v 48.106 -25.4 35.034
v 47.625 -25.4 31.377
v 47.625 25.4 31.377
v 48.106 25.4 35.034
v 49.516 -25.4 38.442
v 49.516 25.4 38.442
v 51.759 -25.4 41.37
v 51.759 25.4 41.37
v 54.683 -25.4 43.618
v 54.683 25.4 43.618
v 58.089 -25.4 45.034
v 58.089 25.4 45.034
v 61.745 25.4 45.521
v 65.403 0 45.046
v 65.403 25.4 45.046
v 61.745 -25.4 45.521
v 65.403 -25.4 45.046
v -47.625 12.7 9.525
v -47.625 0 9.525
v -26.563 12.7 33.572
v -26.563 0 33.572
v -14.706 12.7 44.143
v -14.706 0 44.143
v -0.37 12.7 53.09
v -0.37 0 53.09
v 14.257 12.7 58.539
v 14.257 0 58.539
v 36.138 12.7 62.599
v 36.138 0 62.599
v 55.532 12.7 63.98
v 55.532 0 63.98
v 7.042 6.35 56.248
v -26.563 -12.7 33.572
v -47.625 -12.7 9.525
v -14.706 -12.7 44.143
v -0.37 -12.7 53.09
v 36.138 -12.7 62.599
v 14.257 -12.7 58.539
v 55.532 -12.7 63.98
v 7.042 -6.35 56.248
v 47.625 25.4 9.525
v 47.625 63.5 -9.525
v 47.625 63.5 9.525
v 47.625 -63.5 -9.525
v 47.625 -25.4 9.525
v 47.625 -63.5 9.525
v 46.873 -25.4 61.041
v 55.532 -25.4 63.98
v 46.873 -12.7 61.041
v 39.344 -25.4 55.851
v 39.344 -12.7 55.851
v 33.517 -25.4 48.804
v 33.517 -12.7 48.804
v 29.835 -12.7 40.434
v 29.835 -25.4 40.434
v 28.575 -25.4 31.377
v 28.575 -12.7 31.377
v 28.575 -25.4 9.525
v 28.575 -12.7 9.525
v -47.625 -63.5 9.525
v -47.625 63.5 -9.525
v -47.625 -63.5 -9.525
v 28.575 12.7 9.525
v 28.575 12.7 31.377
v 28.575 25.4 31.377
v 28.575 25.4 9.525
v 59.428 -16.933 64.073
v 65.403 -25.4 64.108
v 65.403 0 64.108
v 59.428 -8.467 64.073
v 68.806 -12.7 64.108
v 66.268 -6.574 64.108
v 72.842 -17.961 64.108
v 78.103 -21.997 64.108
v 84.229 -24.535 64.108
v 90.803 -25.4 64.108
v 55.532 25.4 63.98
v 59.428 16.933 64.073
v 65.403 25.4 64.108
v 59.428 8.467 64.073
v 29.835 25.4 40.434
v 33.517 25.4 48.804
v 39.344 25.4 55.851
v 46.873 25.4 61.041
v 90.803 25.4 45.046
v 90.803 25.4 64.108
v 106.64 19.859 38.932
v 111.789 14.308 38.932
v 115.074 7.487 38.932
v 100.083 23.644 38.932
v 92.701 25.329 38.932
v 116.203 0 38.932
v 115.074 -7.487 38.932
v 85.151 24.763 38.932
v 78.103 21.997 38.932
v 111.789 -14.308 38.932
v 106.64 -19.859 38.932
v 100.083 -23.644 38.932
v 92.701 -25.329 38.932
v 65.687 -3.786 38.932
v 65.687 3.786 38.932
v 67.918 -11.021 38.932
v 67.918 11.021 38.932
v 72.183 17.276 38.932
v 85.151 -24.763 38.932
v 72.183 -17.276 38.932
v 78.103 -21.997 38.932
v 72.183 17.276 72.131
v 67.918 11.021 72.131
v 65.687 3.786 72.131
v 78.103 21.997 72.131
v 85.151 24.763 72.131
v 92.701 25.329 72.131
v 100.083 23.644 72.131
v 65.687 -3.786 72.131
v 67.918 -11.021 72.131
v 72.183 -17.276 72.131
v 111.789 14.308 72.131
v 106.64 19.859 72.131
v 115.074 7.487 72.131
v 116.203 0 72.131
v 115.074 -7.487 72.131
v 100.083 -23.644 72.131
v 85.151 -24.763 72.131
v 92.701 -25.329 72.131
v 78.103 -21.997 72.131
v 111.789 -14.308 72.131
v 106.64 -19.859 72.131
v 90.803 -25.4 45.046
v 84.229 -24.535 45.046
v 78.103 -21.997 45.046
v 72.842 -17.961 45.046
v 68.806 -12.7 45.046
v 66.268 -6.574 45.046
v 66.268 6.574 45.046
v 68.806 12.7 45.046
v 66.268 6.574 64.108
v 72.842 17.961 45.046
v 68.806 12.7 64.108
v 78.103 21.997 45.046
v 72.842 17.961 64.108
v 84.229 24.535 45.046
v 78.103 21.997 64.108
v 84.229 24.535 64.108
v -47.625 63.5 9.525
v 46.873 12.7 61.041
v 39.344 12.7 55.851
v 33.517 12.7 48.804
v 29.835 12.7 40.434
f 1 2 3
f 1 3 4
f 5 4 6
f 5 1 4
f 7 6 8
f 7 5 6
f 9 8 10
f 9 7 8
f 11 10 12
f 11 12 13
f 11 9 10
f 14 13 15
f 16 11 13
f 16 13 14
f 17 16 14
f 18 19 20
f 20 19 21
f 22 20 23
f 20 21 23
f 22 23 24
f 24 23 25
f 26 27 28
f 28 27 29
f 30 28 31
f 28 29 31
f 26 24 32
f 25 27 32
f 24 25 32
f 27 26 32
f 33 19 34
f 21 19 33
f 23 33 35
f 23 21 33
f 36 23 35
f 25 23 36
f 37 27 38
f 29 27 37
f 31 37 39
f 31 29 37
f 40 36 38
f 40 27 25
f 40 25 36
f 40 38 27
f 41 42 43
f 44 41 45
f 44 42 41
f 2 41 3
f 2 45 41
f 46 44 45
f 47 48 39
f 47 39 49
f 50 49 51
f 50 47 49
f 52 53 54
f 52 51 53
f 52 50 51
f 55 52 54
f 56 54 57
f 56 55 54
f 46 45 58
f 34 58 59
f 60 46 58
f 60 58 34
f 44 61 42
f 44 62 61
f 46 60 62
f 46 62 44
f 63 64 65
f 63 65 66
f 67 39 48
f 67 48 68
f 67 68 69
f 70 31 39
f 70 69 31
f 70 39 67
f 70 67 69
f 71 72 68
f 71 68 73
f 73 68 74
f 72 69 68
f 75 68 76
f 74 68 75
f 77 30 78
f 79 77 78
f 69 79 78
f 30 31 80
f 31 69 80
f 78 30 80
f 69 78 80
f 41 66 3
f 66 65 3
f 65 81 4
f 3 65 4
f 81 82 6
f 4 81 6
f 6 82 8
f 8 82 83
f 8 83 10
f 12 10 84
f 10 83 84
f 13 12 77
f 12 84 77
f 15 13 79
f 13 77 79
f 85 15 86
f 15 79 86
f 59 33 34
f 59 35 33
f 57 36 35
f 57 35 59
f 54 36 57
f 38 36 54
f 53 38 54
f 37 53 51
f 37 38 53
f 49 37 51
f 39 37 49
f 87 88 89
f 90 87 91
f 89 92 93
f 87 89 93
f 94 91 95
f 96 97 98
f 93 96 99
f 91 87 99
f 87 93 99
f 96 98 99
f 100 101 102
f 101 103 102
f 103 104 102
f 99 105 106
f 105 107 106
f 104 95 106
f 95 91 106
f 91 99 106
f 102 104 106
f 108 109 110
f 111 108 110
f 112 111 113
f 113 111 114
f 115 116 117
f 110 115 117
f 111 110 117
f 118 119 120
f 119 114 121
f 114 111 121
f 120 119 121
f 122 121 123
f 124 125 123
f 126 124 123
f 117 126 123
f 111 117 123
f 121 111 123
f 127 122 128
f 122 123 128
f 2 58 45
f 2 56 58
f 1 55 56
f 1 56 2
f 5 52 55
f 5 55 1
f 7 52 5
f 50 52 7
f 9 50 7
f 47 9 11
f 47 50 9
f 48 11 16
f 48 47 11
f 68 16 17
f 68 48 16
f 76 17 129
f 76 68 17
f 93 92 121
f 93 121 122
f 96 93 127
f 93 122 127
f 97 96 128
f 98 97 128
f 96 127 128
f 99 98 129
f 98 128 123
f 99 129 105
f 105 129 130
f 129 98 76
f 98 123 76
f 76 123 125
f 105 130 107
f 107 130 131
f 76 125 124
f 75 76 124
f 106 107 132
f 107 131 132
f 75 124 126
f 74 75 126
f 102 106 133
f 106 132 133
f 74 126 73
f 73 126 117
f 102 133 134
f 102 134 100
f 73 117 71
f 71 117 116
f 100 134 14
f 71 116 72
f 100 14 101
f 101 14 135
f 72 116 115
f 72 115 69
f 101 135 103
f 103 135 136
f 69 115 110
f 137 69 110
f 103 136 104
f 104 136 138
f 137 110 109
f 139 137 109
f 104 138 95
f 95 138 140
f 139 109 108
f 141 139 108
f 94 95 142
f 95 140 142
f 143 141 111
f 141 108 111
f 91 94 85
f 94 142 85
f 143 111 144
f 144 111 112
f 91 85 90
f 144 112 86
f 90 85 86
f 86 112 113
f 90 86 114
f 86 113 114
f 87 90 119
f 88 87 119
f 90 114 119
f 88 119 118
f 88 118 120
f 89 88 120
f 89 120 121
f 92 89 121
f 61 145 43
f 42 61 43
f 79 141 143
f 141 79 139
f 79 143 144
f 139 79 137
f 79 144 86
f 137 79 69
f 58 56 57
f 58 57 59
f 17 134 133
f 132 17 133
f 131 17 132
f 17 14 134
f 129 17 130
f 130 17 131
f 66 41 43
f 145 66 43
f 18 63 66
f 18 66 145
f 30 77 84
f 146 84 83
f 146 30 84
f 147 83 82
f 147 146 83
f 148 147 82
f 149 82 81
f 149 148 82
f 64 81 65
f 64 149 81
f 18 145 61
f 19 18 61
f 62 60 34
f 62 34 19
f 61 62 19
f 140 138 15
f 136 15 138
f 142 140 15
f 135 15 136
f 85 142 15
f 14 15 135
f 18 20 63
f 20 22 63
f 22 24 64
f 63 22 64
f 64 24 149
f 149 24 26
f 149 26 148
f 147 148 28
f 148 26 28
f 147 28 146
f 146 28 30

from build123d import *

# Parameters (mm, degrees)
F1_DEPTH = 63.5
F2_DEPTH = 12.7
F0_W     = 25.4
F0_H     = 19.0624117216
F3_DEPTH = 25.4


# Not quite as in the source:
# - a feature names something its author has since deleted; it is built from what else it names


with BuildPart() as f1:
    # F0 (on Front) → F1 (new body, symmetric)
    with BuildSketch(Plane.XZ):
        Polygon((47.625, -9.525), (47.625, 9.525), (28.575, 9.525), (-47.625, 9.525), (-47.625, -9.525), align=None)
    extrude(amount=F1_DEPTH, both=True)

    # F0 (on Front) → F2 (join, symmetric)
    with BuildSketch(Plane.XZ):
        with BuildLine():
            Line((-47.625, 9.525), (28.575, 9.525))
            Line((28.575, 9.525), (28.575, 31.3774505112))
            ThreePointArc((28.575, 31.3774505112), (36.1870844323, 52.5292330788), (55.5320502217, 63.9797367269))
            add(Edge.make_bspline(
                [(-47.625, 9.525), (-32.001836586, 27.9945600123), (-8.2663538638, 59.5795130057), (42.691262939, 63.5782592588), (55.5320502217, 63.9797367269)],
                knots=[0, 0, 0, 0, 0.463039199, 0.7597377555, 0.7597377555, 0.7597377555, 0.7597377555], degree=3))
        make_face()
    extrude(amount=F2_DEPTH, both=True)

    # F0 (on Front) → F3 (join, symmetric)
    with BuildSketch(Plane.XZ):
        with BuildLine():
            Line((28.575, 9.525), (47.625, 9.525))
            Line((47.625, 9.525), (47.625, 31.3774505112))
            ThreePointArc((47.625, 31.3774505112), (53.1477549989, 42.5899481953), (65.4029340449, 45.0458622098))
            Line((65.4029340449, 45.0458622098), (65.4029340449, 64.1082739314))
            add(Edge.make_bspline(
                [(55.5320502217, 63.9797367269), (59.6889735266, 64.1097062534), (63.1060550499, 64.1180929217), (65.4029340449, 64.1082739314)],
                knots=[0.7597377555, 0.7597377555, 0.7597377555, 0.7597377555, 0.8557874071, 0.8557874071, 0.8557874071, 0.8557874071], degree=3))
            ThreePointArc((55.5320502217, 63.9797367269), (36.1870844323, 52.5292330788), (28.575, 31.3774505112))
            Line((28.575, 31.3774505112), (28.575, 9.525))
        make_face()
        with Locations((78.1029340449, 54.5770680706)):
            Rectangle(F0_W, F0_H)
    extrude(amount=F3_DEPTH, both=True)

    # F0 (on Front) → F4 (revolve)
    with BuildSketch(Plane.XZ):
        Polygon((90.8029340449, 64.1082739314), (90.8029340449, 45.0458622098), (90.8029340449, 38.931951193), (116.2029340449, 38.931951193), (116.2029340449, 72.13054624), (90.8029340449, 72.13054624), align=None)
    revolve(axis=Axis((90.8029340449, 0, 55.5312487165), (0, 0, -1)))


solid = f1.part
